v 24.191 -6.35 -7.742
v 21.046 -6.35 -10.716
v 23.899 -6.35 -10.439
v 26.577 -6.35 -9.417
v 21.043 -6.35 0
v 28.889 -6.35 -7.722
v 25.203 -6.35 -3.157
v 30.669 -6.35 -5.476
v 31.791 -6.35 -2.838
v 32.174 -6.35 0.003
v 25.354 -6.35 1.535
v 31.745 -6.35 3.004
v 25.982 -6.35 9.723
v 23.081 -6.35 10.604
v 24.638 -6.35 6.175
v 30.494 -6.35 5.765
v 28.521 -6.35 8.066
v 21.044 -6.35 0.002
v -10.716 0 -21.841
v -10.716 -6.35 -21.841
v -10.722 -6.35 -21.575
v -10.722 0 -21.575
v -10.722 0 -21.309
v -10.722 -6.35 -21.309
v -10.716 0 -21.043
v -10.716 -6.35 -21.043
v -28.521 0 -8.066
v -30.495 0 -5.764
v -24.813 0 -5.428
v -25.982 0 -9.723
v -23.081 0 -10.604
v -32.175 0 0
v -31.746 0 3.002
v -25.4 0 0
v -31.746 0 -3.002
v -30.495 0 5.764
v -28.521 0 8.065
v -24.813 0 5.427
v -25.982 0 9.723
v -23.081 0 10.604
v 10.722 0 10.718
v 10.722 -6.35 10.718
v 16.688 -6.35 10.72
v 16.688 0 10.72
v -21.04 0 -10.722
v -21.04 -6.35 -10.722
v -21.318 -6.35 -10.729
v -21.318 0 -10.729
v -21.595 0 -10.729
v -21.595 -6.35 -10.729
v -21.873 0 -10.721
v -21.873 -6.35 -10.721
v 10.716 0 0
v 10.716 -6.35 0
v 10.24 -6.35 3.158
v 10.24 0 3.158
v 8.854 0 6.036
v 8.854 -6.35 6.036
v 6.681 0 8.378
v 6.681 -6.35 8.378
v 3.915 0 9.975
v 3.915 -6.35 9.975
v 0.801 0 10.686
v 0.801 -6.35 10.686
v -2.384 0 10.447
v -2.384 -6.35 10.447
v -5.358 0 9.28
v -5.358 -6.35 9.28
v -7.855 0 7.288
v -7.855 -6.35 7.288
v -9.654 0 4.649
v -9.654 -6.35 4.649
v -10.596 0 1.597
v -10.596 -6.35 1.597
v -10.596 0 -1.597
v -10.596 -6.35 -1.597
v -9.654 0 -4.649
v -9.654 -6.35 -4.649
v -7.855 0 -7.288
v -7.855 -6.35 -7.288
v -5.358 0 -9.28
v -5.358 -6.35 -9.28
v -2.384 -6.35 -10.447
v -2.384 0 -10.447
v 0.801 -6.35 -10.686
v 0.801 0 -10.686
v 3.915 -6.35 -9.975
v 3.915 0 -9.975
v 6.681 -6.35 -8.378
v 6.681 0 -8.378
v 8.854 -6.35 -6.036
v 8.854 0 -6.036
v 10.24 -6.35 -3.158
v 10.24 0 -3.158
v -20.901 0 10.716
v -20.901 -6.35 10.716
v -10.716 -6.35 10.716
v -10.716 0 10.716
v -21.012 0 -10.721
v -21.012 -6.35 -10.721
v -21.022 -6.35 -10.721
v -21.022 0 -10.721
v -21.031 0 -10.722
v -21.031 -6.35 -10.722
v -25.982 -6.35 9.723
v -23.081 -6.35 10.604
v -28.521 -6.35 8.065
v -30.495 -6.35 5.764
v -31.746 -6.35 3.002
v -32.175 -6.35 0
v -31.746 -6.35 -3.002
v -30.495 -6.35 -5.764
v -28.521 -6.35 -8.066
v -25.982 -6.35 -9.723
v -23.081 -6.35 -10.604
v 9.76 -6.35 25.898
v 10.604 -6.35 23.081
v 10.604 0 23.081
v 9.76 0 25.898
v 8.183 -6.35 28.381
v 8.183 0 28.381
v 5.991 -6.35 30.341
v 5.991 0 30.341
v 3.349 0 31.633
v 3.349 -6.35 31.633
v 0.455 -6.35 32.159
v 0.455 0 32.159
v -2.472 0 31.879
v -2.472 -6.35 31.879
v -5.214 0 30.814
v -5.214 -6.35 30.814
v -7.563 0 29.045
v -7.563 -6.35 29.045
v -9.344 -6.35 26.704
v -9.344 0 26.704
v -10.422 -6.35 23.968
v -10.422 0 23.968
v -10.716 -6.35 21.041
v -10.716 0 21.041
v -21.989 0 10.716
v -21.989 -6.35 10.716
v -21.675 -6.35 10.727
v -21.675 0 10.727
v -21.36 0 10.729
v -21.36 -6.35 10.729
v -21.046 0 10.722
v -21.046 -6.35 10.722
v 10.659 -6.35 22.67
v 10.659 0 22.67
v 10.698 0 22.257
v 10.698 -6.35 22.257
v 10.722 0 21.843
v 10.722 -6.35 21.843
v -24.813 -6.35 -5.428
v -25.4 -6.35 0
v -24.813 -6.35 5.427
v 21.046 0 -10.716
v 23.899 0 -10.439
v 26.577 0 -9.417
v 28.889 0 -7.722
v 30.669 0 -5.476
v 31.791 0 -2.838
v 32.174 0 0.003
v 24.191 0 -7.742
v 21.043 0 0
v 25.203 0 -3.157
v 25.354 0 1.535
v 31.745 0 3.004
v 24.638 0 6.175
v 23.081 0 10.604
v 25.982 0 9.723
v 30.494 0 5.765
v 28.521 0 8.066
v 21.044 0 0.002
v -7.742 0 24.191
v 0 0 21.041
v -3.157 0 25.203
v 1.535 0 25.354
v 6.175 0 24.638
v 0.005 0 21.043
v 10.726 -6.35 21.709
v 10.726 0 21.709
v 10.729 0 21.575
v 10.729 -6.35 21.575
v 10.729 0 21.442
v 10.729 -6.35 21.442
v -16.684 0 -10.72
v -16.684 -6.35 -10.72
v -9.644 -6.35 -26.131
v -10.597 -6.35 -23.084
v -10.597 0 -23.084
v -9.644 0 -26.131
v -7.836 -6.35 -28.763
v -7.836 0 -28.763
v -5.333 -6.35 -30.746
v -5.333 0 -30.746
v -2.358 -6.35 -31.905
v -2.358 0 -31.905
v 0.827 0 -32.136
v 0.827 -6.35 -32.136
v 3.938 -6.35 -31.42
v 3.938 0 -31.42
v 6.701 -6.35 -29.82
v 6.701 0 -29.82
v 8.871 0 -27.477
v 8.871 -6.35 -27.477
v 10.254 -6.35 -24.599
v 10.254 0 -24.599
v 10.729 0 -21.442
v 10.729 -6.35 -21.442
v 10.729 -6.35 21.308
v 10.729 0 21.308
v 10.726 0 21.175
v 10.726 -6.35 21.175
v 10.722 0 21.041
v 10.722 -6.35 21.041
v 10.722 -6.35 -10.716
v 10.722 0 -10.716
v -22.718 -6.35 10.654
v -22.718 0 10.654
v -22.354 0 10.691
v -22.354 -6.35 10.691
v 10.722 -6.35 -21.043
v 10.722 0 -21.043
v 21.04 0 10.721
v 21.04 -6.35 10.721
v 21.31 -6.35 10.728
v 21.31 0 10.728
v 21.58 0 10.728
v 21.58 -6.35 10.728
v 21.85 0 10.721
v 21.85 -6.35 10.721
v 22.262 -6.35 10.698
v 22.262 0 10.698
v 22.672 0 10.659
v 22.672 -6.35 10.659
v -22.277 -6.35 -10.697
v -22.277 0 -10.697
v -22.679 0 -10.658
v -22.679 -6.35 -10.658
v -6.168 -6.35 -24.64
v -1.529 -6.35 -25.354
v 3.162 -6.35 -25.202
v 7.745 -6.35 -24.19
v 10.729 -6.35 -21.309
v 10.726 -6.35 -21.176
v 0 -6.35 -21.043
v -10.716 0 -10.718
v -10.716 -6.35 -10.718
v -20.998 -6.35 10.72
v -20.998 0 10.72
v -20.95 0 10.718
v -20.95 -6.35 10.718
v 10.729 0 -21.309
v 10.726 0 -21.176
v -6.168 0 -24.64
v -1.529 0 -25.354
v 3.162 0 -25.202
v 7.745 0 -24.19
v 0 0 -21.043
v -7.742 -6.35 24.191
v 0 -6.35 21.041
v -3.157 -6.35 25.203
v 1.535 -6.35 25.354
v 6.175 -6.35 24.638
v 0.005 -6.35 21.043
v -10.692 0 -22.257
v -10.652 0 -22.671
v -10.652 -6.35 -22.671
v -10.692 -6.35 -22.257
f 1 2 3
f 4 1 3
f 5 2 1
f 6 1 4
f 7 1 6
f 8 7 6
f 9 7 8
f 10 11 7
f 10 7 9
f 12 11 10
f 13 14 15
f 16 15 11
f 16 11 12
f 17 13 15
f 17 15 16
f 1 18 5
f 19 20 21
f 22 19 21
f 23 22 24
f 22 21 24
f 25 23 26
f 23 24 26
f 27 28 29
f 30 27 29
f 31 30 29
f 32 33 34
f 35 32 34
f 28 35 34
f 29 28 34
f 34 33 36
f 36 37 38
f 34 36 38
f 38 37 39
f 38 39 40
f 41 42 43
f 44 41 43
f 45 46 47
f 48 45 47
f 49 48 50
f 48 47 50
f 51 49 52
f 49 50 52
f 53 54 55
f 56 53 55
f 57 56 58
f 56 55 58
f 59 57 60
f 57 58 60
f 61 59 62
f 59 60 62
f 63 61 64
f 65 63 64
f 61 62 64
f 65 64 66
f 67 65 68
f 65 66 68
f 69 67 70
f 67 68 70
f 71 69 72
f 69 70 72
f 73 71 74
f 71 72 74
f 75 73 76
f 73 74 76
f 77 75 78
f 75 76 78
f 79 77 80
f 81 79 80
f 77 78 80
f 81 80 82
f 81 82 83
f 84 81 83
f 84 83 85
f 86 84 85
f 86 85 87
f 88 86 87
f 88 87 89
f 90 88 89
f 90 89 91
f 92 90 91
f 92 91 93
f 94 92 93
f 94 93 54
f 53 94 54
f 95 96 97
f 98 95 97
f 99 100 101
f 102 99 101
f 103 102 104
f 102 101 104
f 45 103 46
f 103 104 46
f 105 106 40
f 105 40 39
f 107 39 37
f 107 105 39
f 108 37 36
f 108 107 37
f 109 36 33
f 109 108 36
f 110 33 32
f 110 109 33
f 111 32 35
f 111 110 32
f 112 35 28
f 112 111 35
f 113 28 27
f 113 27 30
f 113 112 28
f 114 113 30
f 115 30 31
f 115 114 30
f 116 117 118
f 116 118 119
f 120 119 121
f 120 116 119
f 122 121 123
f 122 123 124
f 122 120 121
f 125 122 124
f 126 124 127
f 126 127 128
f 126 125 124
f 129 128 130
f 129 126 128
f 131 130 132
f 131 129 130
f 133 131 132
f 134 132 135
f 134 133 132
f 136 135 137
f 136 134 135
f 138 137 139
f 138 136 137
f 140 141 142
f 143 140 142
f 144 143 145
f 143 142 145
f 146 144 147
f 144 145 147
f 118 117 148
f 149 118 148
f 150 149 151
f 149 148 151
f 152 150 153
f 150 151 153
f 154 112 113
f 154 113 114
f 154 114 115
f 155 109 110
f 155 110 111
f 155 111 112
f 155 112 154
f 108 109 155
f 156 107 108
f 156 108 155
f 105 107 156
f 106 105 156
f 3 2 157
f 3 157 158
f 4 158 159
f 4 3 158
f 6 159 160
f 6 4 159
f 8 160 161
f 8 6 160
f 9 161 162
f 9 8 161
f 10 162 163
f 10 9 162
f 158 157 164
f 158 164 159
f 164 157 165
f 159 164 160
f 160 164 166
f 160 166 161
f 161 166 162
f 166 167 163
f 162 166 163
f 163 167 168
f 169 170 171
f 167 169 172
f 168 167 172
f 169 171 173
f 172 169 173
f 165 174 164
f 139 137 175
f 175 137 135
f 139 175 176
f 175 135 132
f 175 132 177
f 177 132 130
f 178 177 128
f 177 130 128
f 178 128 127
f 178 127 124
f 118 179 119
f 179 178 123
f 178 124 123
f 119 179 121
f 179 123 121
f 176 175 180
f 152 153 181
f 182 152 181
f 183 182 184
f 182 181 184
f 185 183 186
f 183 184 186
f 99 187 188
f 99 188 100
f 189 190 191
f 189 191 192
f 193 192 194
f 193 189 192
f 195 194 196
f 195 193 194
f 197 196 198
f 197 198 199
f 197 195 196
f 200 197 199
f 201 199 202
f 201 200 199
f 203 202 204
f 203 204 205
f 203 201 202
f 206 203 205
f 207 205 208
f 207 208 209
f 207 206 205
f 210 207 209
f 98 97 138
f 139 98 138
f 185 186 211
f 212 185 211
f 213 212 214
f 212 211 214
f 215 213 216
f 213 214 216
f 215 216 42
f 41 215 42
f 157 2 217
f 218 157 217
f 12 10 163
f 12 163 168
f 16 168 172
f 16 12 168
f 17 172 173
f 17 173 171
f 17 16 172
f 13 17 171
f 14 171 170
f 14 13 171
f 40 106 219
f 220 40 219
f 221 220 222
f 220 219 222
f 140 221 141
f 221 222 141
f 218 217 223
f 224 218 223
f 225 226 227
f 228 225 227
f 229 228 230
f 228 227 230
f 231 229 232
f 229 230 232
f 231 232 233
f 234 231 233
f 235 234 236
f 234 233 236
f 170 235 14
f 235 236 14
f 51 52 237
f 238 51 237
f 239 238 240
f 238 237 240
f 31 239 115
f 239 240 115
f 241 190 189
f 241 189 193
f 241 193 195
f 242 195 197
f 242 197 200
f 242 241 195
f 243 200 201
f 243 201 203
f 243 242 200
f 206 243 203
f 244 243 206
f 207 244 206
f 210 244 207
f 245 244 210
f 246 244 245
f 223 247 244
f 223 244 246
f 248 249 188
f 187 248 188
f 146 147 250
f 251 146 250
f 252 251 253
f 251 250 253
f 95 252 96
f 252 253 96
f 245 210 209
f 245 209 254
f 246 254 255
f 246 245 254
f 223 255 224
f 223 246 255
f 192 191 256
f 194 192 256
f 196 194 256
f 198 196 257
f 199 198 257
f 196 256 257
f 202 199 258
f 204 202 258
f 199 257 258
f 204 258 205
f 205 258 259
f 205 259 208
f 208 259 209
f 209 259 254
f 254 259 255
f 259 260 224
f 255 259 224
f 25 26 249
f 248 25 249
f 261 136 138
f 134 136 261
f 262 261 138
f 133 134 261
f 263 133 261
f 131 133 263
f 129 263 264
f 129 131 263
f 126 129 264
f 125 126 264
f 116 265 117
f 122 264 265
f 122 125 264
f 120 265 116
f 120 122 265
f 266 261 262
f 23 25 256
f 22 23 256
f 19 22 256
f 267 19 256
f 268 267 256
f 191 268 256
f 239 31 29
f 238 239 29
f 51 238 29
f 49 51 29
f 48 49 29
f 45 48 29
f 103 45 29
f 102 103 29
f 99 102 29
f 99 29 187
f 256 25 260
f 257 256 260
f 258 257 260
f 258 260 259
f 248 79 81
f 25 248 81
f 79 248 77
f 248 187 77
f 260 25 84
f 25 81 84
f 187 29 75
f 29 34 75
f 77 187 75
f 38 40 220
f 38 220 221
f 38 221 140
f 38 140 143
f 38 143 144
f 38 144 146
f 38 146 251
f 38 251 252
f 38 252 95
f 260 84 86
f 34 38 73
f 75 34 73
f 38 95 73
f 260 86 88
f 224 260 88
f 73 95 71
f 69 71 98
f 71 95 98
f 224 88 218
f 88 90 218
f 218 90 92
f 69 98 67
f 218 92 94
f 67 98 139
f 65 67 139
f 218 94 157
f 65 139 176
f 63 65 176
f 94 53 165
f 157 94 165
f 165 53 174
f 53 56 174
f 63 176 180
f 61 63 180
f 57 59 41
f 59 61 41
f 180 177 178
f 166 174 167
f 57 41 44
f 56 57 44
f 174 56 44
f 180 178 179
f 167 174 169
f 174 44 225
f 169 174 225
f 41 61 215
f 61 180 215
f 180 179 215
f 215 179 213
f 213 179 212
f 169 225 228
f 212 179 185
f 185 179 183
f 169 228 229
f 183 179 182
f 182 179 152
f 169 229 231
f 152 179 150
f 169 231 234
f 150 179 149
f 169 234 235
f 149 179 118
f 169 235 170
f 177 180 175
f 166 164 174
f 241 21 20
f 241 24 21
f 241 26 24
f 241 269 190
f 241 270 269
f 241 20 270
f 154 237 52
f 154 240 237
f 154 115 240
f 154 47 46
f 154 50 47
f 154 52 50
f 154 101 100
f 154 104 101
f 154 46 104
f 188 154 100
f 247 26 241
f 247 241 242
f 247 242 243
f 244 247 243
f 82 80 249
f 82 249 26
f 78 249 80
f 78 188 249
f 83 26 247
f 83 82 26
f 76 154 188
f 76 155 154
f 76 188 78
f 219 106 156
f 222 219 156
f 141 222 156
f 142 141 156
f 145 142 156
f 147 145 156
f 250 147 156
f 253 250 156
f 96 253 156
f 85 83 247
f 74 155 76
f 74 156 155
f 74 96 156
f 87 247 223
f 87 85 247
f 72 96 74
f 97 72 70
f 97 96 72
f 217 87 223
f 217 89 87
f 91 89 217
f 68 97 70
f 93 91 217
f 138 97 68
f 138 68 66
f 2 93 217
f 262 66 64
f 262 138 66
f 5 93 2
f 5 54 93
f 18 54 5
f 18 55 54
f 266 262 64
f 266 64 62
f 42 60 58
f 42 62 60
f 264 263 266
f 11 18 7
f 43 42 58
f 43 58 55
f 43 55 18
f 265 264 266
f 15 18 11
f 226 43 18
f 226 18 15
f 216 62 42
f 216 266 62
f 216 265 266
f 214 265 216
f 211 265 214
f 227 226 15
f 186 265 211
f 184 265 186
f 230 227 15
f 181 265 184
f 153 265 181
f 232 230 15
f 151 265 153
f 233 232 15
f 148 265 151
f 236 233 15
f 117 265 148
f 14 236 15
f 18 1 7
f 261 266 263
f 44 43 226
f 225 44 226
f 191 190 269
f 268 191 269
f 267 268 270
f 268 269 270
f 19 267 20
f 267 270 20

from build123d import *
from build123d import SkipClean  # not in build123d's __all__

# Parameters (mm, degrees)
F0_R     = 25.4
F1_DEPTH = 6.35
F2_R     = 10.715625
F3_DEPTH = 6.351
F5_DEPTH = 6.351
F7_DEPTH = 6.35


# Not quite as in the source:
# - ends of sketch curves that miss each other by under 0.0002 mm in the source are joined


with BuildPart() as f1:
    # F0 (on Front) → F1 (new body)
    with BuildSketch(Plane.XZ):
        Circle(F0_R)
    extrude(amount=F1_DEPTH)

    # F2 (on face) → F3 (cut, through all)
    with BuildSketch(Plane.XZ.offset(6.35)):
        Circle(F2_R)
    extrude(amount=-F3_DEPTH, mode=Mode.SUBTRACT)

    # F4 (on face) → F5 (cut, through all)
    with BuildSketch(Plane.XZ.offset(6.35)):
        Polygon((-16.6851454689, 10.715625), (-10.715625, 10.715625), (-10.715625, 16.6851454689), (-14.959796627, 14.959796627), align=None)
        with BuildLine():
            Line((-14.959796627, 14.959796627), (-10.715625, 16.6851454689))
            Line((-10.715625, 16.6851454689), (-10.715625, 21.0412820273))
            ThreePointArc((-10.715625, 21.0412820273), (-10.7231093189, 21.441908849), (-10.715625, 21.8425356707))
            Line((-10.715625, 21.8425356707), (-10.715625, 23.0290117213))
            ThreePointArc((-10.715625, 23.0290117213), (-11.3239040523, 22.7360769926), (-11.9241826151, 22.4270789217))
            Line((-11.9241826151, 22.4270789217), (-14.959796627, 14.959796627))
        make_face()
        with BuildLine():
            Line((-20.9014356742, 10.715625), (-16.6851454689, 10.715625))
            Line((-16.6851454689, 10.715625), (-14.959796627, 14.959796627))
            Line((-14.959796627, 14.959796627), (-22.4270789217, 11.9241826151))
            ThreePointArc((-22.4270789217, 11.9241826151), (-22.7360769926, 11.3239040523), (-23.0290117213, 10.715625))
            Line((-23.0290117213, 10.715625), (-21.9888344018, 10.715625))
            ThreePointArc((-21.9888344018, 10.715625), (-21.517375938, 10.7291661682), (-21.0457778798, 10.7219746652))
            ThreePointArc((-21.0457778798, 10.7219746652), (-20.9735960889, 10.7190427964), (-20.9014356742, 10.715625))
        make_face()
        Polygon((-10.715625, -16.6889140547), (-10.715625, -10.7183040998), (-16.6844990564, -10.7197962397), (-14.9584916016, -14.9648416016), align=None)
        Polygon((10.721975, 16.6873822364), (10.721975, 10.7183053524), (16.6882676196, 10.7197968469), (14.9635371125, 14.9635367777), align=None)
        with BuildLine():
            ThreePointArc((-10.715625, 21.8425356707), (-10.7231093189, 21.441908849), (-10.715625, 21.0412820273))
            Line((-10.715625, 21.0412820273), (-10.715625, 21.8425356707))
        make_face()
        with BuildLine():
            Line((-10.715625, 21.8425356707), (-10.715625, 21.0412820273))
            Line((-10.715625, 21.0412820273), (0, 21.0412820273))
            Line((0, 21.0412820273), (0.0045507281, 21.0431319981))
            Line((0.0045507281, 21.0431319981), (-7.7418402479, 24.1914015629))
            ThreePointArc((-7.7418402479, 24.1914015629), (-9.1859591102, 23.6807549547), (-10.596671596, 23.0839890635))
            ThreePointArc((-10.596671596, 23.0839890635), (-10.6742064582, 22.4649926613), (-10.715625, 21.8425356707))
        make_face()
        with BuildLine():
            Line((-22.4270789217, 11.9241826151), (-14.959796627, 14.959796627))
            Line((-14.959796627, 14.959796627), (-11.9241826151, 22.4270789217))
            ThreePointArc((-11.9241826151, 22.4270789217), (-17.9605122421, 17.9605122421), (-22.4270789217, 11.9241826151))
        make_face()
        with BuildLine():
            Line((-10.715625, -21.0430976268), (-10.715625, -16.6889140547))
            Line((-10.715625, -16.6889140547), (-14.9584916016, -14.9648416016))
            Line((-14.9584916016, -14.9648416016), (-11.9244537164, -22.4269347787))
            ThreePointArc((-11.9244537164, -22.4269347787), (-11.3240414708, -22.7360085496), (-10.715625, -23.0290117213))
            Line((-10.715625, -23.0290117213), (-10.715625, -21.8405802232))
            ThreePointArc((-10.715625, -21.8405802232), (-10.7230390601, -21.441838925), (-10.715625, -21.0430976268))
        make_face()
        with BuildLine():
            Line((-14.9584916016, -14.9648416016), (-16.6844990564, -10.7197962397))
            Line((-16.6844990564, -10.7197962397), (-21.0123347342, -10.7208781415))
            ThreePointArc((-21.0123347342, -10.7208781415), (-21.0263755955, -10.7214357653), (-21.0404171751, -10.721975))
            ThreePointArc((-21.0404171751, -10.721975), (-21.4565047306, -10.7296046859), (-21.8725751819, -10.7210931903))
            Line((-21.8725751819, -10.7210931903), (-23.0263322368, -10.7213816143))
            ThreePointArc((-23.0263322368, -10.7213816143), (-22.7327836194, -11.3305140622), (-22.4231246927, -11.9316167813))
            Line((-22.4231246927, -11.9316167813), (-14.9584916016, -14.9648416016))
        make_face()
        Polygon((16.6889139739, -10.7156253348), (10.721975, -10.7156253348), (10.721975, -16.6836133856), (14.9648415328, -14.9584918676), align=None)
        with BuildLine():
            Line((10.721975, 21.0412820273), (10.721975, 16.6873822364))
            Line((10.721975, 16.6873822364), (14.9635371125, 14.9635367777))
            Line((14.9635371125, 14.9635367777), (11.9318881389, 22.4229802979))
            ThreePointArc((11.9318881389, 22.4229802979), (11.3309445253, 22.7325690621), (10.721975, 23.0260559389))
            Line((10.721975, 23.0260559389), (10.721975, 21.8425356707))
            ThreePointArc((10.721975, 21.8425356707), (10.727588076, 21.6422572114), (10.7294593189, 21.441908849))
            ThreePointArc((10.7294593189, 21.441908849), (10.727588076, 21.2415604866), (10.721975, 21.0412820273))
        make_face()
        with BuildLine():
            Line((14.9635371125, 14.9635367777), (16.6882676196, 10.7197968469))
            Line((16.6882676196, 10.7197968469), (21.0404868941, 10.7208848444))
            ThreePointArc((21.0404868941, 10.7208848444), (21.4451864116, 10.7286236807), (21.8498897476, 10.7210871844))
            Line((21.8498897476, 10.7210871844), (23.0263323927, 10.7213812796))
            ThreePointArc((23.0263323927, 10.7213812796), (22.7327152374, 11.3306512582), (22.4229804989, 11.9318877612))
            Line((22.4229804989, 11.9318877612), (14.9635371125, 14.9635367777))
        make_face()
        with BuildLine():
            Line((-10.715625, 23.0290117213), (-10.715625, 21.8425356707))
            ThreePointArc((-10.715625, 21.8425356707), (-10.6742064582, 22.4649926613), (-10.596671596, 23.0839890635))
            ThreePointArc((-10.596671596, 23.0839890635), (-10.6561837529, 23.0565771055), (-10.715625, 23.0290117213))
        make_face()
        with BuildLine():
            Line((-11.9244537164, -22.4269347787), (-14.9584916016, -14.9648416016))
            Line((-14.9584916016, -14.9648416016), (-22.4231246927, -11.9316167813))
            ThreePointArc((-22.4231246927, -11.9316167813), (-17.9576435149, -17.9633805112), (-11.9244537164, -22.4269347787))
        make_face()
        with BuildLine():
            Line((14.9648415328, -14.9584918676), (10.721975, -16.6836133856))
            Line((10.721975, -16.6836133856), (10.721975, -21.0430976268))
            ThreePointArc((10.721975, -21.0430976268), (10.7275353849, -21.2424338153), (10.7293890601, -21.441838925))
            ThreePointArc((10.7293890601, -21.441838925), (10.7275353849, -21.6412440348), (10.721975, -21.8405802232))
            Line((10.721975, -21.8405802232), (10.721975, -23.0260559389))
            ThreePointArc((10.721975, -23.0260559389), (11.3308069807, -22.7326376201), (11.9316167956, -22.4231246851))
            Line((11.9316167956, -22.4231246851), (14.9648415328, -14.9584918676))
        make_face()
        with BuildLine():
            Line((21.0458457391, -10.7156253348), (16.6889139739, -10.7156253348))
            Line((16.6889139739, -10.7156253348), (14.9648415328, -14.9584918676))
            Line((14.9648415328, -14.9584918676), (22.4269345702, -11.9244541084))
            ThreePointArc((22.4269345702, -11.9244541084), (22.7360083683, -11.3240418348), (23.0290115655, -10.7156253348))
            Line((23.0290115655, -10.7156253348), (21.8498897476, -10.7156253348))
            ThreePointArc((21.8498897476, -10.7156253348), (21.4478677434, -10.7231621662), (21.0458457391, -10.7156253348))
        make_face()
        with BuildLine():
            Line((10.721975, -21.0430976268), (0, -21.0430976268))
            Line((0, -21.0430976268), (7.7450996927, -24.1903582187))
            ThreePointArc((7.7450996927, -24.1903582187), (9.1910155426, -23.678792902), (10.6034192636, -23.0808903624))
            ThreePointArc((10.6034192636, -23.0808903624), (10.6807217402, -22.462458185), (10.721975, -21.8405802232))
            Line((10.721975, -21.8405802232), (10.721975, -21.0430976268))
        make_face()
        with BuildLine():
            ThreePointArc((10.7293890601, -21.441838925), (10.7275353849, -21.2424338153), (10.721975, -21.0430976268))
            Line((10.721975, -21.0430976268), (10.721975, -21.8405802232))
            ThreePointArc((10.721975, -21.8405802232), (10.7275353849, -21.6412440348), (10.7293890601, -21.441838925))
        make_face()
        with BuildLine():
            ThreePointArc((-23.0806092952, 10.6040310525), (-22.536149575, 10.6737961307), (-21.9888344018, 10.715625))
            Line((-21.9888344018, 10.715625), (-23.0290117213, 10.715625))
            ThreePointArc((-23.0290117213, 10.715625), (-23.0548780277, 10.6598592451), (-23.0806092952, 10.6040310525))
        make_face()
        with BuildLine():
            Line((11.9318881389, 22.4229802979), (14.9635371125, 14.9635367777))
            Line((14.9635371125, 14.9635367777), (22.4229804989, 11.9318877612))
            ThreePointArc((22.4229804989, 11.9318877612), (17.9605123934, 17.9605120909), (11.9318881389, 22.4229802979))
        make_face()
        with BuildLine():
            ThreePointArc((10.6035074316, 23.0808498576), (10.6807078337, 22.4634116022), (10.721975, 21.8425356707))
            Line((10.721975, 21.8425356707), (10.721975, 23.0260559389))
            ThreePointArc((10.721975, 23.0260559389), (10.6627764128, 23.053528996), (10.6035074316, 23.0808498576))
        make_face()
        with BuildLine():
            ThreePointArc((-10.5965833938, -23.0840295525), (-10.674220495, -22.4640392514), (-10.715625, -21.8405802232))
            Line((-10.715625, -21.8405802232), (-10.715625, -23.0290117213))
            ThreePointArc((-10.715625, -23.0290117213), (-10.6561397042, -23.0565974637), (-10.5965833938, -23.0840295525))
        make_face()
        with BuildLine():
            Line((-23.0263322368, -10.7213816143), (-21.8725751819, -10.7210931903))
            ThreePointArc((-21.8725751819, -10.7210931903), (-22.4781957728, -10.6797622384), (-23.0805097356, -10.60424775))
            ThreePointArc((-23.0805097356, -10.60424775), (-23.0534953804, -10.6628490914), (-23.0263322368, -10.7213816143))
        make_face()
        with BuildLine():
            Line((22.4269345702, -11.9244541084), (14.9648415328, -14.9584918676))
            Line((14.9648415328, -14.9584918676), (11.9316167956, -22.4231246851))
            ThreePointArc((11.9316167956, -22.4231246851), (17.96338036, -17.9576436662), (22.4269345702, -11.9244541084))
        make_face()
        with BuildLine():
            Line((21.043166974, 0), (21.0458457391, -10.7156253348))
            Line((21.0458457391, -10.7156253348), (21.8498897476, -10.7156253348))
            ThreePointArc((21.8498897476, -10.7156253348), (22.4684041732, -10.6745013006), (23.083509992, -10.5977151524))
            ThreePointArc((23.083509992, -10.5977151524), (23.6805472866, -9.1864944461), (24.19140152, -7.7418403819))
            Line((24.19140152, -7.7418403819), (21.0440741561, 0.0022325353))
            Line((21.0440741561, 0.0022325353), (21.043166974, 0))
        make_face()
        with BuildLine():
            Line((21.8498897476, -10.7156253348), (21.0458457391, -10.7156253348))
            ThreePointArc((21.0458457391, -10.7156253348), (21.4478677434, -10.7231621662), (21.8498897476, -10.7156253348))
        make_face()
        with BuildLine():
            Line((10.721975, -23.0260559389), (10.721975, -21.8405802232))
            ThreePointArc((10.721975, -21.8405802232), (10.6807217402, -22.462458185), (10.6034192636, -23.0808903624))
            ThreePointArc((10.6034192636, -23.0808903624), (10.662732381, -23.0535493617), (10.721975, -23.0260559389))
        make_face()
        with BuildLine():
            Line((23.0263323927, 10.7213812796), (21.8498897476, 10.7210871844))
            ThreePointArc((21.8498897476, 10.7210871844), (22.467044649, 10.680093007), (23.0808104612, 10.603593186))
            ThreePointArc((23.0808104612, 10.603593186), (23.053646654, 10.6625220259), (23.0263323927, 10.7213812796))
        make_face()
        with BuildLine():
            ThreePointArc((23.083509992, -10.5977151524), (22.4684041732, -10.6745013006), (21.8498897476, -10.7156253348))
            Line((21.8498897476, -10.7156253348), (23.0290115655, -10.7156253348))
            ThreePointArc((23.0290115655, -10.7156253348), (23.056336153, -10.6567050818), (23.083509992, -10.5977151524))
        make_face()
    extrude(amount=-F5_DEPTH, mode=Mode.SUBTRACT)

    # F6 (on face) → F7 (join)
    with BuildSketch(Plane.XZ.offset(6.35)):
        with BuildLine():
            ThreePointArc((-23.0805097356, -10.60424775), (-25.3999999997, -0.0001192371), (-23.0806092952, 10.6040310525))
            ThreePointArc((-23.0806092952, 10.6040310525), (-32.1746450763, -0.0001510398), (-23.0805097356, -10.60424775))
        make_face()
        with BuildLine():
            ThreePointArc((-7.7418402479, 24.1914015629), (1.5348016289, 25.353587201), (10.6035074316, 23.0808498576))
            ThreePointArc((10.6035074316, 23.0808498576), (-1.0183277532, 32.1194416828), (-10.715625, 21.0412820273))
            Line((-10.715625, 21.0412820273), (0, 21.0412820273))
            Line((0, 21.0412820273), (0.0045507281, 21.0431319981))
            Line((0.0045507281, 21.0431319981), (-7.7418402479, 24.1914015629))
        make_face()
        with BuildLine():
            ThreePointArc((32.1737608344, 0.0027309248), (29.5891069493, 6.9859255227), (23.0808104612, 10.603593186))
            ThreePointArc((23.0808104612, 10.603593186), (25.353584354, 1.534848658), (24.19140152, -7.7418403819))
            Line((24.19140152, -7.7418403819), (21.0440741561, 0.0022325353))
            Line((21.0440741561, 0.0022325353), (21.043166974, 0))
            Line((21.043166974, 0), (21.0458457391, -10.7156253348))
            ThreePointArc((21.0458457391, -10.7156253348), (28.8887258109, -7.7224495792), (32.1737608344, 0.0027309248))
        make_face()
        with BuildLine():
            ThreePointArc((10.7293890601, -21.441838925), (10.7275353849, -21.2424338153), (10.721975, -21.0430976268))
            Line((10.721975, -21.0430976268), (0, -21.0430976268))
            Line((0, -21.0430976268), (7.7450996927, -24.1903582187))
            ThreePointArc((7.7450996927, -24.1903582187), (-1.5292908827, -25.3539201978), (-10.5965833938, -23.0840295525))
            ThreePointArc((-10.5965833938, -23.0840295525), (0.8267011217, -32.136392342), (10.7293890601, -21.441838925))
        make_face()
    with SkipClean():  # cleaning this boolean's faces spoils the solid; the shape is the same uncleaned
        extrude(amount=-F7_DEPTH)


solid = f1.part
